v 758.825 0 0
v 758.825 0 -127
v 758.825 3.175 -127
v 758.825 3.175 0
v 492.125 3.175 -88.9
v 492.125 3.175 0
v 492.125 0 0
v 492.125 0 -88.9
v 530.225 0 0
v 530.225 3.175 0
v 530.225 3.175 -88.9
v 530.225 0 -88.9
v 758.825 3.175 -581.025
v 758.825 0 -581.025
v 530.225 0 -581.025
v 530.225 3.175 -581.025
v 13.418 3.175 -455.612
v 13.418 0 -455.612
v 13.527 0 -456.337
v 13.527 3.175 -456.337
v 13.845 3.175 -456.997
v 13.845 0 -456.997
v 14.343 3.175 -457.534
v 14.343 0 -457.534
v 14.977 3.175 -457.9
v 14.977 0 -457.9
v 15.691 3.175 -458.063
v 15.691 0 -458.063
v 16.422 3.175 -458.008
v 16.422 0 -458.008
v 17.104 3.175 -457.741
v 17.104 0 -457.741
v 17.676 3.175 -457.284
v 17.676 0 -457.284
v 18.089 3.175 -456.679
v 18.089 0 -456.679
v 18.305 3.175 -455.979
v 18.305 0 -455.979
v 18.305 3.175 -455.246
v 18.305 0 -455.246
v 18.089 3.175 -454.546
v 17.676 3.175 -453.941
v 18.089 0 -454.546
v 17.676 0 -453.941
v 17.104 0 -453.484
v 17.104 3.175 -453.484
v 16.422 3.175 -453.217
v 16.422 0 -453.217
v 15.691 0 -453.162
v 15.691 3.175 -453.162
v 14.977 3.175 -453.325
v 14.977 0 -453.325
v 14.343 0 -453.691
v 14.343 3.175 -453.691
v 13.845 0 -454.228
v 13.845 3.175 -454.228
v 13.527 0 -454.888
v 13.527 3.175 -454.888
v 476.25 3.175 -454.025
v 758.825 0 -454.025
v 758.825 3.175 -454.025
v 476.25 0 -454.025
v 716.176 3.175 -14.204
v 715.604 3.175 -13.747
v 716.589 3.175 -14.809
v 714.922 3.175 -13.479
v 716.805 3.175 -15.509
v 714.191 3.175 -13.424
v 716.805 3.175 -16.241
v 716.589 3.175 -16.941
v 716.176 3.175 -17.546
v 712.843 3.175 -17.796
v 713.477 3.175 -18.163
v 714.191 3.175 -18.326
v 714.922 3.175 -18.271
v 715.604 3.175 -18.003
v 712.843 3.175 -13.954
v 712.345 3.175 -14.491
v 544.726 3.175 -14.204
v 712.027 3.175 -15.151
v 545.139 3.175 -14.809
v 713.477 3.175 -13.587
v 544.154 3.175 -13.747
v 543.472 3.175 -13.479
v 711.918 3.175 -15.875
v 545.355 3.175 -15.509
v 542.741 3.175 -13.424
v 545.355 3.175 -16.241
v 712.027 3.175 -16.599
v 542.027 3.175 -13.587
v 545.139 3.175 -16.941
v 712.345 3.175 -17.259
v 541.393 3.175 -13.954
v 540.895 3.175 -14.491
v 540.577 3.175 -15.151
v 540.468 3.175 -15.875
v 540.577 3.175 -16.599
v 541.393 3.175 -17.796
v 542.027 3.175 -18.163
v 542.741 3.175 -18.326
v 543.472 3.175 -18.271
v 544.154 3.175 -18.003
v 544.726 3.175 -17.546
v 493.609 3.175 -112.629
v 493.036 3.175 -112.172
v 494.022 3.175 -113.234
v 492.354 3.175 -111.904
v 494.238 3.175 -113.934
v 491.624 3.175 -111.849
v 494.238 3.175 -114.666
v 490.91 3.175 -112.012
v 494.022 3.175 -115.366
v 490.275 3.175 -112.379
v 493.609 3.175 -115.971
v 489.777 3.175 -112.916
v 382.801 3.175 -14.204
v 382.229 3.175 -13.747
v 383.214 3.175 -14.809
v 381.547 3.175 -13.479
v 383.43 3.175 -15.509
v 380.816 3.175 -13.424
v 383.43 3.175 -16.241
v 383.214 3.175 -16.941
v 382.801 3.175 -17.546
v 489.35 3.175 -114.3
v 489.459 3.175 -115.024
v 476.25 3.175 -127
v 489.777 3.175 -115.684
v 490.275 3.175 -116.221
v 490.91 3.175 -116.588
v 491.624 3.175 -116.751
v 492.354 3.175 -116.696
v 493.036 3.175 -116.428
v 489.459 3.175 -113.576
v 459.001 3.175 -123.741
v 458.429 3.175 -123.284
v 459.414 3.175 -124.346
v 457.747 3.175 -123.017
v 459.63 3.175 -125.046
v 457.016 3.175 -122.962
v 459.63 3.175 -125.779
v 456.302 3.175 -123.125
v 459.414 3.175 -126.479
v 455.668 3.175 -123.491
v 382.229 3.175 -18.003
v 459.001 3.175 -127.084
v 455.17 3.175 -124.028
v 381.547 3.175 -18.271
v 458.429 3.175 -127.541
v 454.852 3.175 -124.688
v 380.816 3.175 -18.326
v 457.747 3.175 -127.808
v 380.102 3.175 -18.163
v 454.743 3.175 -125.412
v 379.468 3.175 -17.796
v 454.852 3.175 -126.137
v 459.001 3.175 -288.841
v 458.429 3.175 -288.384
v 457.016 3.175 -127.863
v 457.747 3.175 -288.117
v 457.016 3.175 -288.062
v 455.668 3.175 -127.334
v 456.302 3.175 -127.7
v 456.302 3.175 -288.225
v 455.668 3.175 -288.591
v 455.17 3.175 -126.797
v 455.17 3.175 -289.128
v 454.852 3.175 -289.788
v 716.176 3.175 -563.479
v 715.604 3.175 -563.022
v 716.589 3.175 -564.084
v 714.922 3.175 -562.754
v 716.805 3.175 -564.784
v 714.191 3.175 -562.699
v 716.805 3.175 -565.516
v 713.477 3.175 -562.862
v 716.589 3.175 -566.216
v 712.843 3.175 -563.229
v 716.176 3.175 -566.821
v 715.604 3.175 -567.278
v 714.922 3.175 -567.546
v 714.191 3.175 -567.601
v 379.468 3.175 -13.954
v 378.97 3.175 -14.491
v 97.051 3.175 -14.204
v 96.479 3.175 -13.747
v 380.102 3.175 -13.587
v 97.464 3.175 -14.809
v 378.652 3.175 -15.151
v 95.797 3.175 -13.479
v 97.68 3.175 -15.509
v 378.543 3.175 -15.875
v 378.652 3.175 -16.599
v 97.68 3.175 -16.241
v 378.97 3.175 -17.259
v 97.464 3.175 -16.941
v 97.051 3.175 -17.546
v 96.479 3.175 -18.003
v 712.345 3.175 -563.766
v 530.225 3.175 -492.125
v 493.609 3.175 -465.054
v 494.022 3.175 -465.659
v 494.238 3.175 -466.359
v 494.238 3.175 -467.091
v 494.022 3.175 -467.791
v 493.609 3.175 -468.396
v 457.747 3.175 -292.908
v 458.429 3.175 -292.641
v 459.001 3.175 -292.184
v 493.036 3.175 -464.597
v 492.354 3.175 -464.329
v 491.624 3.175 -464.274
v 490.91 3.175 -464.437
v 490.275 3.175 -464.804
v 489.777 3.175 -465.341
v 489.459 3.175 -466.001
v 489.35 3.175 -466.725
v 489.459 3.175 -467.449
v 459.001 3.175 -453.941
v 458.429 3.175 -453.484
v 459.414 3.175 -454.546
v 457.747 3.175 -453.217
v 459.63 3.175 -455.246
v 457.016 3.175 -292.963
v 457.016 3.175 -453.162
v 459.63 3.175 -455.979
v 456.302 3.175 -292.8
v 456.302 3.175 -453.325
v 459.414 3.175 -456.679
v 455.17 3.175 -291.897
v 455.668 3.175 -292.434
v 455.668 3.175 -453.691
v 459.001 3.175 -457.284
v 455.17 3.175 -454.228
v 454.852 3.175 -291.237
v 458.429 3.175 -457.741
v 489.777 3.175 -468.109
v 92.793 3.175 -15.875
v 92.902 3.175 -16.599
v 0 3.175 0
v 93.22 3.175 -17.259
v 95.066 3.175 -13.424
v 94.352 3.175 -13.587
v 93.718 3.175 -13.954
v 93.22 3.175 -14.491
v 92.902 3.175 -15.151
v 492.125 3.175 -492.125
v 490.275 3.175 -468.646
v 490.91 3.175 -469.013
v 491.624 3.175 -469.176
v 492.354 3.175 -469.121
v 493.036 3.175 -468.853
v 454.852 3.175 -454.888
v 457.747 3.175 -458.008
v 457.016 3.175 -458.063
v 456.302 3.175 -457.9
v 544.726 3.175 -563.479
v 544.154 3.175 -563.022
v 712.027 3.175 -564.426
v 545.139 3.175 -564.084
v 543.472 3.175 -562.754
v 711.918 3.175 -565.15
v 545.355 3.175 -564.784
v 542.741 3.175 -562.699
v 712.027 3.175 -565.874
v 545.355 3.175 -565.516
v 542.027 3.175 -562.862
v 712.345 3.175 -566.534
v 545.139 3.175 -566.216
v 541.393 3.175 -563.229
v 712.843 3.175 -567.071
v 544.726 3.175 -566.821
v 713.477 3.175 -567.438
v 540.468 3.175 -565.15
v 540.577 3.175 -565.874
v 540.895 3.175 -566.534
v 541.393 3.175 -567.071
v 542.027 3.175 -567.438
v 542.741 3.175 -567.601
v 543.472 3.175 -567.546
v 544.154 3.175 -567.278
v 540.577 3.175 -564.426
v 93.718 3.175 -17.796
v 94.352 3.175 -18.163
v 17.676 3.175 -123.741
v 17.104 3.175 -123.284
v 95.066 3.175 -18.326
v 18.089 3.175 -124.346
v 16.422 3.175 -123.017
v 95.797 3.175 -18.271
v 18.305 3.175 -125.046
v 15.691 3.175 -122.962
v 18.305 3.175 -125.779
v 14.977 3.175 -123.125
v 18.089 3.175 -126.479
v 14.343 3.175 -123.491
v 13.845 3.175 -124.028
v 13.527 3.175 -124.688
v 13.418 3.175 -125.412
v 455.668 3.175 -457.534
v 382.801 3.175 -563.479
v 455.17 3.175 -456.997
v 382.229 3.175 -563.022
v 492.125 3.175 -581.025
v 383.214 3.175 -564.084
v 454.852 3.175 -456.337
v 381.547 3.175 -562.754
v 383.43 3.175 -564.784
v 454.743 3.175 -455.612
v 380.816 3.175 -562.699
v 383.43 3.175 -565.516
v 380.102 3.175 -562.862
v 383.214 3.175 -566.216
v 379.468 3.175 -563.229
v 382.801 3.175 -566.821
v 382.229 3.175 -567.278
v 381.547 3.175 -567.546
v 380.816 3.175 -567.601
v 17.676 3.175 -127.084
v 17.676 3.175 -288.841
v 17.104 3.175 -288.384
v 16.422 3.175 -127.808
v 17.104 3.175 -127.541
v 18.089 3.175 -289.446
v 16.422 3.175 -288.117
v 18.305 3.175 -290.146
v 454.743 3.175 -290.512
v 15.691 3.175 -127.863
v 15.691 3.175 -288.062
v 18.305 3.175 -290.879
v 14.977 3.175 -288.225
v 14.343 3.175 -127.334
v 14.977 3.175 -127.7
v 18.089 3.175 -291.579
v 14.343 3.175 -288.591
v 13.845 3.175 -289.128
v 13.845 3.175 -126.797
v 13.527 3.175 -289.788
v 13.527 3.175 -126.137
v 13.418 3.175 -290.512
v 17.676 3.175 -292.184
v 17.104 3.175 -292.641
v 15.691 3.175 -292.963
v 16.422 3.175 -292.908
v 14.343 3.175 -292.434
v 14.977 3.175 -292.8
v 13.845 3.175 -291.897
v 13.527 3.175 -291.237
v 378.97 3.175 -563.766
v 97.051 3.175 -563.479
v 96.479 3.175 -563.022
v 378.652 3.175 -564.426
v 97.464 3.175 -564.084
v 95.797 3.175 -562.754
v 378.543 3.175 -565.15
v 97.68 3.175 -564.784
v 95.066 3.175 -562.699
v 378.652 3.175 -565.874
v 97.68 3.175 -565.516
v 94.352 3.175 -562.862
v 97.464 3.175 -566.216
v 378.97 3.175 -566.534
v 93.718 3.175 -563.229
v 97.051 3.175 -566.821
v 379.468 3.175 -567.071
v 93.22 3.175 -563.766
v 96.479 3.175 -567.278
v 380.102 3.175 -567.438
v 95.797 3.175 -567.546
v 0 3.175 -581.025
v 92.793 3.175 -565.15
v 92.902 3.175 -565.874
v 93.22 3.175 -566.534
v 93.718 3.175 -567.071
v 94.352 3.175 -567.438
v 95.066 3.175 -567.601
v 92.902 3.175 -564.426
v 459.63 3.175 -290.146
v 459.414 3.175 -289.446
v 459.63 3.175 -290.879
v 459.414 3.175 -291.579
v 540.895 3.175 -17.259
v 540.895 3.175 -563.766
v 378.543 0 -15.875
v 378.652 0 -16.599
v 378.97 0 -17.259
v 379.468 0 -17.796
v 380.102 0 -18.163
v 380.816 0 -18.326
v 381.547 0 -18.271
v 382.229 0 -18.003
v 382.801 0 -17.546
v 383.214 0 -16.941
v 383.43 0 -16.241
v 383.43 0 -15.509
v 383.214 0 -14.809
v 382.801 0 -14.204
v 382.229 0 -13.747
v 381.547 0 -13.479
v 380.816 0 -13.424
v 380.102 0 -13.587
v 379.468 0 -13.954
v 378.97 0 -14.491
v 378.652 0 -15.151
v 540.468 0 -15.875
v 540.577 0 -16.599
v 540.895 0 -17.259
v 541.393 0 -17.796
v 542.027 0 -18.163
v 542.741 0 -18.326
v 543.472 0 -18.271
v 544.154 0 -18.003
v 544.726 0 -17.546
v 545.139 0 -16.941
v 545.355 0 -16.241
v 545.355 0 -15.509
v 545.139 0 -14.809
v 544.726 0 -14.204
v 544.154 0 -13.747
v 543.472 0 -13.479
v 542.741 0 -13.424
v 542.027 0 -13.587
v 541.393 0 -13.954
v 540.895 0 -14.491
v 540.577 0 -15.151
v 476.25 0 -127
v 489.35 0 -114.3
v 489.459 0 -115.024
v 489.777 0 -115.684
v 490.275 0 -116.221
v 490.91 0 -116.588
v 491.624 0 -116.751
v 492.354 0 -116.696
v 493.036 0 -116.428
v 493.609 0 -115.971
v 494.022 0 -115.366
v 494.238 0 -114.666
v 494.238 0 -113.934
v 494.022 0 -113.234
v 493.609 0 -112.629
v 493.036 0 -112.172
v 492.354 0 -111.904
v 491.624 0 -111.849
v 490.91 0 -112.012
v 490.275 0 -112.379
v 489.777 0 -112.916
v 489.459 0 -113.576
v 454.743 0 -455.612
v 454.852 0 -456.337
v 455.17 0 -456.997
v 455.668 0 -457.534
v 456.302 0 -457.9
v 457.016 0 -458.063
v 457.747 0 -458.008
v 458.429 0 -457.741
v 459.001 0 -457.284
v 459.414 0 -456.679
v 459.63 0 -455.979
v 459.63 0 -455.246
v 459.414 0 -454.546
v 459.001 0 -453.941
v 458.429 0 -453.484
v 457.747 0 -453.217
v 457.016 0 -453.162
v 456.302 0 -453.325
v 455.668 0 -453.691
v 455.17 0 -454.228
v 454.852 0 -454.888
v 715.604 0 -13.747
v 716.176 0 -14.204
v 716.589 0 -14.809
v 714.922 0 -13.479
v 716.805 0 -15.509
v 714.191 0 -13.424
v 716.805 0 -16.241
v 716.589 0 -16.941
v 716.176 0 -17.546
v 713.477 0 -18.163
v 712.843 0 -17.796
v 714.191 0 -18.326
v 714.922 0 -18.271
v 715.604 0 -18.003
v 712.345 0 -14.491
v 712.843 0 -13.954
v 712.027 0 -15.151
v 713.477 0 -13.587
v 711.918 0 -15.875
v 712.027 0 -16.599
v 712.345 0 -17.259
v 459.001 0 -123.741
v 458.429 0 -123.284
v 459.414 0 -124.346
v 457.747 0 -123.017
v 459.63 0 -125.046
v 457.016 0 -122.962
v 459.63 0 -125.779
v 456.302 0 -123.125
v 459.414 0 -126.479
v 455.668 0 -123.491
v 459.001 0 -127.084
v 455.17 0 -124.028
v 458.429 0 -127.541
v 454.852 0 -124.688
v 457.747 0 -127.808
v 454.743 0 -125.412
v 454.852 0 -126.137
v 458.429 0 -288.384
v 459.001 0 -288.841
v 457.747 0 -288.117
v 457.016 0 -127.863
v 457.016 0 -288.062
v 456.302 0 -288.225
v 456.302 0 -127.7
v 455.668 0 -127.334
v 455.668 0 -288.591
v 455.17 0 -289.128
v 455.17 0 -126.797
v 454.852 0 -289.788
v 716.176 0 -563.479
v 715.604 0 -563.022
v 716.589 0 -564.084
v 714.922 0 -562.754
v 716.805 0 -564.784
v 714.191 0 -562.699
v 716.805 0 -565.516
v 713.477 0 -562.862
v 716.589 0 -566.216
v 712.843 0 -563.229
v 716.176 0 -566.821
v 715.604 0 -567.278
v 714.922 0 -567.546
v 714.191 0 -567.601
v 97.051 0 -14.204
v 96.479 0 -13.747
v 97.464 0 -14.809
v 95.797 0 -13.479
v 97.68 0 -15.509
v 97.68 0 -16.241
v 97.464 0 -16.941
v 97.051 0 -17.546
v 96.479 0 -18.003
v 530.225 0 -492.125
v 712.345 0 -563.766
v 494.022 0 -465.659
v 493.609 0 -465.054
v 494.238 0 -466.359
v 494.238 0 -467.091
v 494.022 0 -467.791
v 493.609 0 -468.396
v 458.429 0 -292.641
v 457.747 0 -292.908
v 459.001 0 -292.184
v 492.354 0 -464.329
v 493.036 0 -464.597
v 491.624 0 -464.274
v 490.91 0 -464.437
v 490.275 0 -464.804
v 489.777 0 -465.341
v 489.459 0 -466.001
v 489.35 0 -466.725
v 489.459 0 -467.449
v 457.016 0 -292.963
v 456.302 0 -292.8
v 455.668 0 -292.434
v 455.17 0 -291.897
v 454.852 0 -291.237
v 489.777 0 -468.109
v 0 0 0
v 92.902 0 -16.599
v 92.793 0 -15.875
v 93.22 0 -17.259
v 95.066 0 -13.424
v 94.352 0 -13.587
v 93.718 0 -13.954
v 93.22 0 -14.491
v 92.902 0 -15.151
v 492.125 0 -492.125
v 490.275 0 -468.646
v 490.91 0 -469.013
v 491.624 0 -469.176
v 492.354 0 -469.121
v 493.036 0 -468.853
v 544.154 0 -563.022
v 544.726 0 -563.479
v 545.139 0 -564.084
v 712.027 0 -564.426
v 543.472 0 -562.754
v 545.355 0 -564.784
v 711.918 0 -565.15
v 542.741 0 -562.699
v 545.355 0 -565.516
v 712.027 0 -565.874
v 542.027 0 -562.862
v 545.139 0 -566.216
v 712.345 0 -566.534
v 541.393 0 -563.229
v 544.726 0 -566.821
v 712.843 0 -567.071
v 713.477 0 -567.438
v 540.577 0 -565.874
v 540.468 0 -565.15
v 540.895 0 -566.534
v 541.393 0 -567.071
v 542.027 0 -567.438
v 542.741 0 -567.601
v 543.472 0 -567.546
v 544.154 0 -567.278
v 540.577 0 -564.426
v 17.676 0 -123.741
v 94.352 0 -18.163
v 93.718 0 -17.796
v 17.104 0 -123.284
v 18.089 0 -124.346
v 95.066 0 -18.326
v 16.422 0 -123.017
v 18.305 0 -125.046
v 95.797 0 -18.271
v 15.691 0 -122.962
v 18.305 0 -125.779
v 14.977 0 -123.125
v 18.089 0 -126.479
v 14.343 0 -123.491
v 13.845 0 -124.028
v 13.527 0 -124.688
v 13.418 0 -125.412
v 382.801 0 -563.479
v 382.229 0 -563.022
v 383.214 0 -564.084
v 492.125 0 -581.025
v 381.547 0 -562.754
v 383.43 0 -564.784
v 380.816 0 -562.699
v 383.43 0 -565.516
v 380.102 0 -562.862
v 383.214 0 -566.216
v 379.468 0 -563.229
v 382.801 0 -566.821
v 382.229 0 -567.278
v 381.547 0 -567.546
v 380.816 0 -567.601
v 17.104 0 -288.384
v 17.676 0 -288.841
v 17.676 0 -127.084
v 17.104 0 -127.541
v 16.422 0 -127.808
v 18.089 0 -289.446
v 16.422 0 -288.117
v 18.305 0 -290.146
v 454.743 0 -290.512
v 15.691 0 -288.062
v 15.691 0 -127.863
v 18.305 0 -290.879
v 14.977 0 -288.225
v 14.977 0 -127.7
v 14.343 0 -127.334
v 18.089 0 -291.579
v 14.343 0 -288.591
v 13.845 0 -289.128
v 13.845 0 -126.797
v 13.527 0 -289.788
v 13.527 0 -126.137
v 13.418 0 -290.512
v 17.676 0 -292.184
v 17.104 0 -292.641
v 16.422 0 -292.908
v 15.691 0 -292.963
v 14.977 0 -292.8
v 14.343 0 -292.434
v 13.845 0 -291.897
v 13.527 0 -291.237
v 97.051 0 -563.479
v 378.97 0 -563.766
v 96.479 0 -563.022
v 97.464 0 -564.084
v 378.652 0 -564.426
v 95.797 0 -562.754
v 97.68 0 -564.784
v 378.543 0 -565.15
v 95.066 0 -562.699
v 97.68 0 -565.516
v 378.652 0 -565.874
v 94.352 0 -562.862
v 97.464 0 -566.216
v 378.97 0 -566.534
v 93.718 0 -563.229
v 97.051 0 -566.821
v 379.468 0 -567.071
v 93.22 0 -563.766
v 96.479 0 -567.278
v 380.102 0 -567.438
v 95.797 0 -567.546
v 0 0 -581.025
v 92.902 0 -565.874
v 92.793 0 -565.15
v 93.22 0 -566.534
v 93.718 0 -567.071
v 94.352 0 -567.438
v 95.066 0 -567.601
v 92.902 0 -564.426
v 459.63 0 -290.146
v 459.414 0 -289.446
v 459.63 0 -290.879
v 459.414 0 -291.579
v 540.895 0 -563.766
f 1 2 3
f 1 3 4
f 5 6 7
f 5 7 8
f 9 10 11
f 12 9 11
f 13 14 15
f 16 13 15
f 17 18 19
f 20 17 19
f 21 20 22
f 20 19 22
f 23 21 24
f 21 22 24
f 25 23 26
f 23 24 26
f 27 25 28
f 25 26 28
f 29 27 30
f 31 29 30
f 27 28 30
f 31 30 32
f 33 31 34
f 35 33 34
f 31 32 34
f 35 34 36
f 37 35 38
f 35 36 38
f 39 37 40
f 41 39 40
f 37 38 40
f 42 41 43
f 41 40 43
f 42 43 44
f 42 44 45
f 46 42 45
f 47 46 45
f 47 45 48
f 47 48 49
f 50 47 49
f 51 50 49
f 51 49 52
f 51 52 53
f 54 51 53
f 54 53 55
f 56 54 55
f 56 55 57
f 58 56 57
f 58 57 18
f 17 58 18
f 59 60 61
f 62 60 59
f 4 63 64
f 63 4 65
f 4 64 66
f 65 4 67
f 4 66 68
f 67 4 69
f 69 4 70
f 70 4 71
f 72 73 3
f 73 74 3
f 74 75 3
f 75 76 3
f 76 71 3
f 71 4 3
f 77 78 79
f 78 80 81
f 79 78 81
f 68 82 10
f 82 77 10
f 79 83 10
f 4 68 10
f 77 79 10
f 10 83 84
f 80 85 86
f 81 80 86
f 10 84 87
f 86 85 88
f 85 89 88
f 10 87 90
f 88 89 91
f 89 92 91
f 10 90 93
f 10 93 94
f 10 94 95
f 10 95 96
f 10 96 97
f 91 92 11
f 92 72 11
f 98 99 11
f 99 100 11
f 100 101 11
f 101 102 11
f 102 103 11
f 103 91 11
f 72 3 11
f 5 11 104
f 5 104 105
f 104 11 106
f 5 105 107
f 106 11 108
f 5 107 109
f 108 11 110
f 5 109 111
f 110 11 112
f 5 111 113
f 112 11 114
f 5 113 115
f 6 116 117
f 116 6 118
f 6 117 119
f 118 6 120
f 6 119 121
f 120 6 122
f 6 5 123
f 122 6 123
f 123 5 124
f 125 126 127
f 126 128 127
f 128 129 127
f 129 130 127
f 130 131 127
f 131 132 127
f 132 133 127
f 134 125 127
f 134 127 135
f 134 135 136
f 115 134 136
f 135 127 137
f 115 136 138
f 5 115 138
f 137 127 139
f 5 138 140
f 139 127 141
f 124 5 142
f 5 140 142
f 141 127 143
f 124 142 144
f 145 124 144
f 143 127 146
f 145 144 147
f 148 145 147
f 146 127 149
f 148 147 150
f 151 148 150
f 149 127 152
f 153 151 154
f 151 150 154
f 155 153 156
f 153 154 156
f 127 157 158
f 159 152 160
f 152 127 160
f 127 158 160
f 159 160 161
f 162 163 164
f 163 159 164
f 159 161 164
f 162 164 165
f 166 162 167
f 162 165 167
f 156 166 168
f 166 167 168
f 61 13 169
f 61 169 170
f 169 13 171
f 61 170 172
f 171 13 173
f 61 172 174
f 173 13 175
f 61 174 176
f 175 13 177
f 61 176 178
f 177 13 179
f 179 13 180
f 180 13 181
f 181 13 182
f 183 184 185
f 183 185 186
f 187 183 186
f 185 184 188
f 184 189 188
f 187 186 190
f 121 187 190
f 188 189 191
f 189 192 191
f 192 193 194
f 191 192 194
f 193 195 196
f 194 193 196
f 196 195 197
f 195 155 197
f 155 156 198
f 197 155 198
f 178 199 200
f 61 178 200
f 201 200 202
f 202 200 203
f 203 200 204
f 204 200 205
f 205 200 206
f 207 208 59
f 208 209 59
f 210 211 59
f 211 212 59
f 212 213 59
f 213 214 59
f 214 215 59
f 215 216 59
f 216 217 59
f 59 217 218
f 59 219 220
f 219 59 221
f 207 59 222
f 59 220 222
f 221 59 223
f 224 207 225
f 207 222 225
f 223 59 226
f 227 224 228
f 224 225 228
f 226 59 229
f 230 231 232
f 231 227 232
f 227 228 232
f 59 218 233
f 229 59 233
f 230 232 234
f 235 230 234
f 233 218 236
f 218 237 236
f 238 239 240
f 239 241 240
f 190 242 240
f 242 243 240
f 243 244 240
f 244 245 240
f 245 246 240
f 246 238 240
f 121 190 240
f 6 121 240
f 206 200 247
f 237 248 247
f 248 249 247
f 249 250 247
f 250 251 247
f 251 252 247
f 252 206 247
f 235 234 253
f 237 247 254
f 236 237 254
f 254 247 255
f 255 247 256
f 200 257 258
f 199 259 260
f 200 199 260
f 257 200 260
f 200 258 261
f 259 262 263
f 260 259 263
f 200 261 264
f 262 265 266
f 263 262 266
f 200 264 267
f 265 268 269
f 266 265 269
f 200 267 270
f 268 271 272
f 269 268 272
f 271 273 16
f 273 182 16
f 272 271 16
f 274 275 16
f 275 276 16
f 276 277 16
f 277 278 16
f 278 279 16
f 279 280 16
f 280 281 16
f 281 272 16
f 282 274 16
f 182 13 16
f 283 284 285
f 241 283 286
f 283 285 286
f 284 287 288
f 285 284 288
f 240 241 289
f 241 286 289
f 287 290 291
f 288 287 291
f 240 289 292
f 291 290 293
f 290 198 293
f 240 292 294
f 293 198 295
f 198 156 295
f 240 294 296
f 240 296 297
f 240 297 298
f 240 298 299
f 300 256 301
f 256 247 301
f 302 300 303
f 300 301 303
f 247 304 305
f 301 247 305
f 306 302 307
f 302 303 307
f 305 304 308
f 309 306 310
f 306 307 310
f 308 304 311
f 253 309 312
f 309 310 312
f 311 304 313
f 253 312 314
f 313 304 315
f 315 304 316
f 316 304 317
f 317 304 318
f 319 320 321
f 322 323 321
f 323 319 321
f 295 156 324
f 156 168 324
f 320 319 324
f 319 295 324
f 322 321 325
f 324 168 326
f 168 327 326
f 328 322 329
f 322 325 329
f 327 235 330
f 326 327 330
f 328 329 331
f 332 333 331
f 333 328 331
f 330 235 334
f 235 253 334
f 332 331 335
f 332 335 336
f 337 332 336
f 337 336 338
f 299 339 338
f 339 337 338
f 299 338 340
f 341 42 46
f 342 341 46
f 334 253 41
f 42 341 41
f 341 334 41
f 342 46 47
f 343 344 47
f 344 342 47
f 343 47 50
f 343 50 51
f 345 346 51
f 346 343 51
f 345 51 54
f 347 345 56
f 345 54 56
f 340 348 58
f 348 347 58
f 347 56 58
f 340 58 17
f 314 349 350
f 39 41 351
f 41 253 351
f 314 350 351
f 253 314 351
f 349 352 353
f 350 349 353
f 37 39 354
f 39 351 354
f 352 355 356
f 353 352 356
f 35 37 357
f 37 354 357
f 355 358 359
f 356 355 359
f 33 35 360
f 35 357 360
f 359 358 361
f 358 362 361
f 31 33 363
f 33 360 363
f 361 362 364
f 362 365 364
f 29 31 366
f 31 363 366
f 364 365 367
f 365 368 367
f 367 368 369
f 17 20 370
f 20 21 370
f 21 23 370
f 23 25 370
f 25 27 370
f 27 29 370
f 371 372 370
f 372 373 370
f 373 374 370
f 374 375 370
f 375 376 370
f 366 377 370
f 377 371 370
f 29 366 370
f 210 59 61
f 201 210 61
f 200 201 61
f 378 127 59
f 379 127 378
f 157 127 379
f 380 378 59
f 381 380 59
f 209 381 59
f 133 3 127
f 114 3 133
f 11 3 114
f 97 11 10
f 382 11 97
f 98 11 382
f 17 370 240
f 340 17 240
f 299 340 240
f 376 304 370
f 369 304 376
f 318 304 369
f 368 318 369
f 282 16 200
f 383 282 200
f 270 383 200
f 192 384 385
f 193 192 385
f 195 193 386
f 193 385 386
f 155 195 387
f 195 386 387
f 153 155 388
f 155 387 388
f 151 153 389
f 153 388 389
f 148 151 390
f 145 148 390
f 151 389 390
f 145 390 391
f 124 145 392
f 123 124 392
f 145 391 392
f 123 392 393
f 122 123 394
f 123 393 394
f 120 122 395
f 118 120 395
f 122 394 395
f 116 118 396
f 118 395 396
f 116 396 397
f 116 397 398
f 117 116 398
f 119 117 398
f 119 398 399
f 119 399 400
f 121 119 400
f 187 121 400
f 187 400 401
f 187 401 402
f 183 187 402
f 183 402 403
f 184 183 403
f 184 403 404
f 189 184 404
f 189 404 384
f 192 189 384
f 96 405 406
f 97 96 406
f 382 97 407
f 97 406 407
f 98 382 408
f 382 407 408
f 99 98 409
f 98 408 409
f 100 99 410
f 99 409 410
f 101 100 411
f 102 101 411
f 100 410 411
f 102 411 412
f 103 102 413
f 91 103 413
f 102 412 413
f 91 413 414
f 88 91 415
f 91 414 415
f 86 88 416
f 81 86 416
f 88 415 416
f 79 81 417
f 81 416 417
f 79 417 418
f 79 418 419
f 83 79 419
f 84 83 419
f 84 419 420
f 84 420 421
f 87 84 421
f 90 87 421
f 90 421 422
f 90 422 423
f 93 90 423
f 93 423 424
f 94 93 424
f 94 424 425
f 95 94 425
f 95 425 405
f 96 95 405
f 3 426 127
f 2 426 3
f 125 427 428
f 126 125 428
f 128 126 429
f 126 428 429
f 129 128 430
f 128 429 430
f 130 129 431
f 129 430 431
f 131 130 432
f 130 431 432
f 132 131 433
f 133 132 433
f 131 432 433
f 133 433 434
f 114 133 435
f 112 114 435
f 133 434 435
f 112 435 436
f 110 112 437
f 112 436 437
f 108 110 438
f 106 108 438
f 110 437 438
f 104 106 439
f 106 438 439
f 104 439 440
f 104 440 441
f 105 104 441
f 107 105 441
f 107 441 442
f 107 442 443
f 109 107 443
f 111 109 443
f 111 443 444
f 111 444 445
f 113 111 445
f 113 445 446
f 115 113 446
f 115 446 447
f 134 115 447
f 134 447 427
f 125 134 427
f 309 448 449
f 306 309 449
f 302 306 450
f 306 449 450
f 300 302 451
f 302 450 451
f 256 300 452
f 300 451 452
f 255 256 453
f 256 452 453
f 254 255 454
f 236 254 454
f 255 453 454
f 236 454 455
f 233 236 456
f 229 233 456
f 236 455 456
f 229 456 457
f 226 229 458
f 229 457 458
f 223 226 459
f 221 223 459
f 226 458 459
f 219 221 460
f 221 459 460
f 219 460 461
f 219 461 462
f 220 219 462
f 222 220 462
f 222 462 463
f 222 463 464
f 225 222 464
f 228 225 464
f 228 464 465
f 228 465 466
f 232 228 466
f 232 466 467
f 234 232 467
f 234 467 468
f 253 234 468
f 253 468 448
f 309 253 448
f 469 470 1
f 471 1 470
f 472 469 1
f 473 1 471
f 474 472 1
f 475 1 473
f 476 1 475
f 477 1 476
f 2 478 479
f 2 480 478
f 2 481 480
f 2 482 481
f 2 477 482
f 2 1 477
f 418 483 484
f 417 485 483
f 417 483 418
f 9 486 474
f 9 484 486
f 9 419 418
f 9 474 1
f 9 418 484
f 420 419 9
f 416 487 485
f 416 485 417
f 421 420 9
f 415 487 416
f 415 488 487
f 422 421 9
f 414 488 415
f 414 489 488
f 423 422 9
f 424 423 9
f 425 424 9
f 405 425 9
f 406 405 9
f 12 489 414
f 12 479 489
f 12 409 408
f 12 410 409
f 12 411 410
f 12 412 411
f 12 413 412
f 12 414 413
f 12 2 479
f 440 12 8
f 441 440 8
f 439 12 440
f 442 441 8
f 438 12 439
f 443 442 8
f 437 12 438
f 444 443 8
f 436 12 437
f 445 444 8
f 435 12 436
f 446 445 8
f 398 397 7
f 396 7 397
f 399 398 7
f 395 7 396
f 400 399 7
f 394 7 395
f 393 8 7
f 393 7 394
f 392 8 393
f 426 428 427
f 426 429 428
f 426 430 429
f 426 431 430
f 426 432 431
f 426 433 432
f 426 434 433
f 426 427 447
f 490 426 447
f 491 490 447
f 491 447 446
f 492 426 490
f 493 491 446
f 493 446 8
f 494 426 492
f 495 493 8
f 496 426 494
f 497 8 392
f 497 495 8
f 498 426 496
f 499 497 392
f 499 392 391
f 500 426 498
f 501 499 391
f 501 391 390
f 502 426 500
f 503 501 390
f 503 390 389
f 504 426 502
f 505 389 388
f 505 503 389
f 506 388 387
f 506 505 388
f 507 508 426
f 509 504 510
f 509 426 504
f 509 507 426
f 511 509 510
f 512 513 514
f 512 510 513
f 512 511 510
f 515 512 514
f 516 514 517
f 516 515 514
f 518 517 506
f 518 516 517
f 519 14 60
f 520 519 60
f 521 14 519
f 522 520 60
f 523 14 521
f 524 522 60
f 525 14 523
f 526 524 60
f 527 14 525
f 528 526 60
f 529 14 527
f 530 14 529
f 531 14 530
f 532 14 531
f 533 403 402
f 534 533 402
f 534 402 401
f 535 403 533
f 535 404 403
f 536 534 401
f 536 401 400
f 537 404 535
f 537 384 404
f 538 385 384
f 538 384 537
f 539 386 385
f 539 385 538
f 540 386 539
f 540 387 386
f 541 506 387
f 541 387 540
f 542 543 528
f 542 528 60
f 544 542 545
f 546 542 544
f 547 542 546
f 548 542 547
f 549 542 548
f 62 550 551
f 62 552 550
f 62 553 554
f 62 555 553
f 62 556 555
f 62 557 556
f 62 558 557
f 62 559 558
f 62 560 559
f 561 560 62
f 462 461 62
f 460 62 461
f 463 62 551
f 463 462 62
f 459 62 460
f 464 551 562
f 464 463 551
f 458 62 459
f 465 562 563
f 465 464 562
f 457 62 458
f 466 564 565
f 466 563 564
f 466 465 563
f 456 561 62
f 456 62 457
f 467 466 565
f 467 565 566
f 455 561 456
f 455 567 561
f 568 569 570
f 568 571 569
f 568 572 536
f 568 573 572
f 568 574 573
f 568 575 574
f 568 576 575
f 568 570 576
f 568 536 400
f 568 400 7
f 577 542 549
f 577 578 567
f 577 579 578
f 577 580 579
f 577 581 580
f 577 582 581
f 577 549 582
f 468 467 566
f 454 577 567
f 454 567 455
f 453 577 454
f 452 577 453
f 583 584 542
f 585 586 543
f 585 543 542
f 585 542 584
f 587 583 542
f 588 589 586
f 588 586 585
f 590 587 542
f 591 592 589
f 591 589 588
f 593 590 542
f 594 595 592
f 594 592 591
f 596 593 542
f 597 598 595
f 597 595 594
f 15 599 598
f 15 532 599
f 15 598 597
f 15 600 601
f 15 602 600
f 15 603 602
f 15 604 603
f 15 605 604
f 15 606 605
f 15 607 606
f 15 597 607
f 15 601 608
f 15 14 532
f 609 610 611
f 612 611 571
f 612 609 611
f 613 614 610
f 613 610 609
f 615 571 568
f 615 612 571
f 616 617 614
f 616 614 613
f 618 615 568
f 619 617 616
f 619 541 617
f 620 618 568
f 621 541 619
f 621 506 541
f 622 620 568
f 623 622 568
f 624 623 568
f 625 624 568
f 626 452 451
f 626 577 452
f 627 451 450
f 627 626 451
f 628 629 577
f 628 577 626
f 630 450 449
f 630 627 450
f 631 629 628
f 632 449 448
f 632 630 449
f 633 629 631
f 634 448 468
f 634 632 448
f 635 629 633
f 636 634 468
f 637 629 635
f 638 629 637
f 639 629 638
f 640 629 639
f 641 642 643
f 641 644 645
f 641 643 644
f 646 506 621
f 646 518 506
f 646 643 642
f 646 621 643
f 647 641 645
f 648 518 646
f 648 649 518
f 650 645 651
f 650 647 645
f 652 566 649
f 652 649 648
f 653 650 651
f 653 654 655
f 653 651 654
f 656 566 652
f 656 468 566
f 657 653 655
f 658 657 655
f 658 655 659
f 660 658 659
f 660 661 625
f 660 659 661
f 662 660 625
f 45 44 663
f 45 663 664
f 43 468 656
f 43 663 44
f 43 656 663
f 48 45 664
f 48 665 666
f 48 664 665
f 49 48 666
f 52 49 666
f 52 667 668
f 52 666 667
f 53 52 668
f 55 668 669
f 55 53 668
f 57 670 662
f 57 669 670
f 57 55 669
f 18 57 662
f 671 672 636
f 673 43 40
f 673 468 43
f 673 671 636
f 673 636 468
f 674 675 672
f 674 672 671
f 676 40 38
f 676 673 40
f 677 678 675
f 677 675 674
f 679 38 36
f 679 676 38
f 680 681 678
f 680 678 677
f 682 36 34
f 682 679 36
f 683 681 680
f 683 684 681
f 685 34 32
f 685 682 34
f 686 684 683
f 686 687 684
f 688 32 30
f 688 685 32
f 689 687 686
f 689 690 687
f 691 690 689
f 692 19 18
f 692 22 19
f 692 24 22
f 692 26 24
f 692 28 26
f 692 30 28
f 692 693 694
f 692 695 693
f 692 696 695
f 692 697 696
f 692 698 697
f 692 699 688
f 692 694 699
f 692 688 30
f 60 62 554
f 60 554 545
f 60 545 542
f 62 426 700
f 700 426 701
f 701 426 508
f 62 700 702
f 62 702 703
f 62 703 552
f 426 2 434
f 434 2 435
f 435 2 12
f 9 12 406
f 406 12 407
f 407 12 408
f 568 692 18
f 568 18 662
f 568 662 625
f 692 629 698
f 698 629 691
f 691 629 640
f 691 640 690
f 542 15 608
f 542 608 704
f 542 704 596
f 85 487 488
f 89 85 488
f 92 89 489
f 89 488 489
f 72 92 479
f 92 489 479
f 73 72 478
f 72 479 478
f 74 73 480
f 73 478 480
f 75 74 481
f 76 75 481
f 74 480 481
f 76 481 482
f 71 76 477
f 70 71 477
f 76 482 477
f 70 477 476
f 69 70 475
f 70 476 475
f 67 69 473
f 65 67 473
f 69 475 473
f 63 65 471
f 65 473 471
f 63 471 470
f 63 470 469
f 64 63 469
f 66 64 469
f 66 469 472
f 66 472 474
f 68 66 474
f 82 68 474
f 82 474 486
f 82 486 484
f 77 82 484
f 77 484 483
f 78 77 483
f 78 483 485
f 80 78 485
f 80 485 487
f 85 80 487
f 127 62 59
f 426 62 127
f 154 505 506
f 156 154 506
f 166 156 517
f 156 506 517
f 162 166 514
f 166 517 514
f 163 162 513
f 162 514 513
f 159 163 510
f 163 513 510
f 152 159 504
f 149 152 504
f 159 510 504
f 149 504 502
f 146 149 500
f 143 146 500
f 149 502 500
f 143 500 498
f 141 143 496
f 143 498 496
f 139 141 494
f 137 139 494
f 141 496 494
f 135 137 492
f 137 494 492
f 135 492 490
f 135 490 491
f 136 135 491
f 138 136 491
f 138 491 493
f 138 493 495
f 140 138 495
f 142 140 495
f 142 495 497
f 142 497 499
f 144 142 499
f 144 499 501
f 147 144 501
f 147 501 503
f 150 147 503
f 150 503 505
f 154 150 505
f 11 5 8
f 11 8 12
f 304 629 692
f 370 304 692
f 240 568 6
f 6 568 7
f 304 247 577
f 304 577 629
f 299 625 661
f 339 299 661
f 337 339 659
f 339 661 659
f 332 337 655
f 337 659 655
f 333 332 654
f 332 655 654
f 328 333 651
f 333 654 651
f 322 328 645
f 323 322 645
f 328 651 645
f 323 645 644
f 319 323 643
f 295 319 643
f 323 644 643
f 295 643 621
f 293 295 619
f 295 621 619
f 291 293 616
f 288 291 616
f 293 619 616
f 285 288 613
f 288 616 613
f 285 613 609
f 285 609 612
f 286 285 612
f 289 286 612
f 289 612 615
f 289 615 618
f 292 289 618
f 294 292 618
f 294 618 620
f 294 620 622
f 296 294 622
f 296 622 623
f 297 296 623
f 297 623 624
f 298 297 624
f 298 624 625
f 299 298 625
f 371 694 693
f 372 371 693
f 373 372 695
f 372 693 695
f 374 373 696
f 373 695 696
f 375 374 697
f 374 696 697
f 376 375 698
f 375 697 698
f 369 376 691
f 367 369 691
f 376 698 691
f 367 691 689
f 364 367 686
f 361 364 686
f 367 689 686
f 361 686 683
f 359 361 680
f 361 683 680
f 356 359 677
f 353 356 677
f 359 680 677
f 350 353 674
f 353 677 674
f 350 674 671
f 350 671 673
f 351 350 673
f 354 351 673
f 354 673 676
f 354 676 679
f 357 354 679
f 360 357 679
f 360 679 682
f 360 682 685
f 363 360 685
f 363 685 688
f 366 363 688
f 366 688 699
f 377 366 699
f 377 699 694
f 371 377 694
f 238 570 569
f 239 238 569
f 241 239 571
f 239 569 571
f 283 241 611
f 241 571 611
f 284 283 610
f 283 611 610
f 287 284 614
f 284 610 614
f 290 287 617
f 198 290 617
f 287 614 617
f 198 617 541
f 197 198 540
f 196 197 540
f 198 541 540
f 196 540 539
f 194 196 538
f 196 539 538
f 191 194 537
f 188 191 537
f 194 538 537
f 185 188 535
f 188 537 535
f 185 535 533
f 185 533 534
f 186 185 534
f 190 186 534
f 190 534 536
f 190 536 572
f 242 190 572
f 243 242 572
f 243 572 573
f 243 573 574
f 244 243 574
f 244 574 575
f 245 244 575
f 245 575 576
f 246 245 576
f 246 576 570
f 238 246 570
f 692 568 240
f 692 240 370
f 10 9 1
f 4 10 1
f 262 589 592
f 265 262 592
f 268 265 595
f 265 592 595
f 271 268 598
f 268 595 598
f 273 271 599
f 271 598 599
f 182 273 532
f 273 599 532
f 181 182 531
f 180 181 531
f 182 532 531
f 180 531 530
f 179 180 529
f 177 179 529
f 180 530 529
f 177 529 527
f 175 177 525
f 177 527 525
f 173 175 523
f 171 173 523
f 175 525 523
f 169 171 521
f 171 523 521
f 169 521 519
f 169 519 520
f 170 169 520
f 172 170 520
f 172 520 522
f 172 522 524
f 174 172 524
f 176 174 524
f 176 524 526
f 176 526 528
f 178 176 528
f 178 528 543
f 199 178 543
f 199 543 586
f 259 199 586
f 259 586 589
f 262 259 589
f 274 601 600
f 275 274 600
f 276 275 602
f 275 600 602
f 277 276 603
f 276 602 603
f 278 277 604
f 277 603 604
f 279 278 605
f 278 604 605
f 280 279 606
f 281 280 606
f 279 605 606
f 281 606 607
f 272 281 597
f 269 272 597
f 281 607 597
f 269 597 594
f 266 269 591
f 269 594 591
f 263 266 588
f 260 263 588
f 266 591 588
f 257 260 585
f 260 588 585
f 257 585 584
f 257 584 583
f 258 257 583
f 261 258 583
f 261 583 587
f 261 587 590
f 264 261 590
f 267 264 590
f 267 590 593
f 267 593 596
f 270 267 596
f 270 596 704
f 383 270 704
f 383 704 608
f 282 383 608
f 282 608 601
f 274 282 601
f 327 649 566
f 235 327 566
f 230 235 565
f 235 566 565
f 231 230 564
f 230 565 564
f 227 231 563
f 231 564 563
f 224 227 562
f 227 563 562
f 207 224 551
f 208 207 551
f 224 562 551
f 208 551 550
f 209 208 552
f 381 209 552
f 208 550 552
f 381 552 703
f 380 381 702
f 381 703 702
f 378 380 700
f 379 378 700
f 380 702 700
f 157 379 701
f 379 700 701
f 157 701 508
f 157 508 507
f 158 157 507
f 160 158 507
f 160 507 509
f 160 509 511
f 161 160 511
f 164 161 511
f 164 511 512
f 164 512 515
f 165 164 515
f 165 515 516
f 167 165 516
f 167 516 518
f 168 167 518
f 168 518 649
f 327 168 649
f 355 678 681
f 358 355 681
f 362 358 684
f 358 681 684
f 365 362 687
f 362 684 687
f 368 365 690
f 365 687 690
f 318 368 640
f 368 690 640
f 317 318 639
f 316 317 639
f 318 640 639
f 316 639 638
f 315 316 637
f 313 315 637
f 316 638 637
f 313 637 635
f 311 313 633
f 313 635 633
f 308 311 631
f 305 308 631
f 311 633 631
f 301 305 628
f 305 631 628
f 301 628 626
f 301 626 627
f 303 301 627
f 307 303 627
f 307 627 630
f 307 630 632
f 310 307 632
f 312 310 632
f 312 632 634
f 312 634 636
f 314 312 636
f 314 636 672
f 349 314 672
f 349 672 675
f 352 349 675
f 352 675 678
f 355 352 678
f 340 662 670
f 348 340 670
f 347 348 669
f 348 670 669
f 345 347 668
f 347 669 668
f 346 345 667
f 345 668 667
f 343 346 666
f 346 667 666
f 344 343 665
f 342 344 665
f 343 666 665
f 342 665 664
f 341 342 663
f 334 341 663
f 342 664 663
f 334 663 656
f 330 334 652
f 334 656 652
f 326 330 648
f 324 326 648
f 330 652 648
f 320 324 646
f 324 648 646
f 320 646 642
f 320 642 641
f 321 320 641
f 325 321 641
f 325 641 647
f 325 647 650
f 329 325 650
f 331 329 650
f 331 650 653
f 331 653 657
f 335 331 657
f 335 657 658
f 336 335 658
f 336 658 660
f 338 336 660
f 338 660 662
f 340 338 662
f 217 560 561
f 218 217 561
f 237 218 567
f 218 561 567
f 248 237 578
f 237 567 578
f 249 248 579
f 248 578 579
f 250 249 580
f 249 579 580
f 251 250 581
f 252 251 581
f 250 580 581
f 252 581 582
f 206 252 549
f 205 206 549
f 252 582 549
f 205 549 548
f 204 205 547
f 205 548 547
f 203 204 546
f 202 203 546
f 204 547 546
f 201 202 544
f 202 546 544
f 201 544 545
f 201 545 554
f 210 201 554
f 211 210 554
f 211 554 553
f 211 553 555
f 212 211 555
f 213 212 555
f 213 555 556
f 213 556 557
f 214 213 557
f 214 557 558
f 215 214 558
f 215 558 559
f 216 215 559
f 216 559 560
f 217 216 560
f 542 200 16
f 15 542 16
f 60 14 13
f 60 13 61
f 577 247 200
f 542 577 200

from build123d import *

# Parameters (mm, degrees)
BOSS_EXTRUDE1_DEPTH          = 3.175
F_10_0_1935_DIAMETER_HOLE2_D = 4.9149
SKETCH8_W                    = 38.1
SKETCH8_H                    = 88.9
CUT_EXTRUDE1_DEPTH           = 3.175
F_10_0_1935_DIAMETER_HOLE3_D = 4.9149


with BuildPart() as part:
    # Sketch1 → Boss-Extrude1 (new body)
    with BuildSketch(Plane(origin=(0, 0, 0), x_dir=(1, 0, 0), z_dir=(0, 1, 0))):
        Polygon((476.25, 581.025), (758.825, 581.025), (758.825, 454.025), (476.25, 454.025), (476.25, 127), (758.825, 127), (758.825, 0), (447.675, 0), (0, 0), (0, 581.025), align=None)
    extrude(amount=BOSS_EXTRUDE1_DEPTH)

    # #10 (0.1935) Diameter Hole2 (through all)
    with Locations(Plane(origin=(0, 3.175, 0), x_dir=(1, 0, 0), z_dir=(0, 1, 0))):
        with Locations((15.875, 455.6125), (15.875, 125.4125), (15.875, 290.5125), (381, 565.15), (381, 15.875), (95.25, 565.15), (95.25, 15.875), (457.2, 125.4125), (457.2, 290.5125), (457.2, 455.6125)):
            Hole(F_10_0_1935_DIAMETER_HOLE2_D / 2)

    # Sketch8 → Cut-Extrude1 (cut)
    with BuildSketch(Plane(origin=(0, 3.175, 0), x_dir=(1, 0, 0), z_dir=(0, 1, 0))):
        with Locations((511.175, 44.45)):
            Rectangle(SKETCH8_W, SKETCH8_H)
        with Locations((511.175, 536.575)):
            Rectangle(SKETCH8_W, SKETCH8_H)
    extrude(amount=-CUT_EXTRUDE1_DEPTH, mode=Mode.SUBTRACT)

    # #10 (0.1935) Diameter Hole3 (through all)
    with Locations(Plane(origin=(0, 3.175, 0), x_dir=(1, 0, 0), z_dir=(0, 1, 0))):
        with Locations((491.8075, 114.3), (542.925, 15.875), (714.375, 15.875), (491.8075, 466.725), (542.925, 565.15), (714.375, 565.15)):
            Hole(F_10_0_1935_DIAMETER_HOLE3_D / 2)


solid = part.part
